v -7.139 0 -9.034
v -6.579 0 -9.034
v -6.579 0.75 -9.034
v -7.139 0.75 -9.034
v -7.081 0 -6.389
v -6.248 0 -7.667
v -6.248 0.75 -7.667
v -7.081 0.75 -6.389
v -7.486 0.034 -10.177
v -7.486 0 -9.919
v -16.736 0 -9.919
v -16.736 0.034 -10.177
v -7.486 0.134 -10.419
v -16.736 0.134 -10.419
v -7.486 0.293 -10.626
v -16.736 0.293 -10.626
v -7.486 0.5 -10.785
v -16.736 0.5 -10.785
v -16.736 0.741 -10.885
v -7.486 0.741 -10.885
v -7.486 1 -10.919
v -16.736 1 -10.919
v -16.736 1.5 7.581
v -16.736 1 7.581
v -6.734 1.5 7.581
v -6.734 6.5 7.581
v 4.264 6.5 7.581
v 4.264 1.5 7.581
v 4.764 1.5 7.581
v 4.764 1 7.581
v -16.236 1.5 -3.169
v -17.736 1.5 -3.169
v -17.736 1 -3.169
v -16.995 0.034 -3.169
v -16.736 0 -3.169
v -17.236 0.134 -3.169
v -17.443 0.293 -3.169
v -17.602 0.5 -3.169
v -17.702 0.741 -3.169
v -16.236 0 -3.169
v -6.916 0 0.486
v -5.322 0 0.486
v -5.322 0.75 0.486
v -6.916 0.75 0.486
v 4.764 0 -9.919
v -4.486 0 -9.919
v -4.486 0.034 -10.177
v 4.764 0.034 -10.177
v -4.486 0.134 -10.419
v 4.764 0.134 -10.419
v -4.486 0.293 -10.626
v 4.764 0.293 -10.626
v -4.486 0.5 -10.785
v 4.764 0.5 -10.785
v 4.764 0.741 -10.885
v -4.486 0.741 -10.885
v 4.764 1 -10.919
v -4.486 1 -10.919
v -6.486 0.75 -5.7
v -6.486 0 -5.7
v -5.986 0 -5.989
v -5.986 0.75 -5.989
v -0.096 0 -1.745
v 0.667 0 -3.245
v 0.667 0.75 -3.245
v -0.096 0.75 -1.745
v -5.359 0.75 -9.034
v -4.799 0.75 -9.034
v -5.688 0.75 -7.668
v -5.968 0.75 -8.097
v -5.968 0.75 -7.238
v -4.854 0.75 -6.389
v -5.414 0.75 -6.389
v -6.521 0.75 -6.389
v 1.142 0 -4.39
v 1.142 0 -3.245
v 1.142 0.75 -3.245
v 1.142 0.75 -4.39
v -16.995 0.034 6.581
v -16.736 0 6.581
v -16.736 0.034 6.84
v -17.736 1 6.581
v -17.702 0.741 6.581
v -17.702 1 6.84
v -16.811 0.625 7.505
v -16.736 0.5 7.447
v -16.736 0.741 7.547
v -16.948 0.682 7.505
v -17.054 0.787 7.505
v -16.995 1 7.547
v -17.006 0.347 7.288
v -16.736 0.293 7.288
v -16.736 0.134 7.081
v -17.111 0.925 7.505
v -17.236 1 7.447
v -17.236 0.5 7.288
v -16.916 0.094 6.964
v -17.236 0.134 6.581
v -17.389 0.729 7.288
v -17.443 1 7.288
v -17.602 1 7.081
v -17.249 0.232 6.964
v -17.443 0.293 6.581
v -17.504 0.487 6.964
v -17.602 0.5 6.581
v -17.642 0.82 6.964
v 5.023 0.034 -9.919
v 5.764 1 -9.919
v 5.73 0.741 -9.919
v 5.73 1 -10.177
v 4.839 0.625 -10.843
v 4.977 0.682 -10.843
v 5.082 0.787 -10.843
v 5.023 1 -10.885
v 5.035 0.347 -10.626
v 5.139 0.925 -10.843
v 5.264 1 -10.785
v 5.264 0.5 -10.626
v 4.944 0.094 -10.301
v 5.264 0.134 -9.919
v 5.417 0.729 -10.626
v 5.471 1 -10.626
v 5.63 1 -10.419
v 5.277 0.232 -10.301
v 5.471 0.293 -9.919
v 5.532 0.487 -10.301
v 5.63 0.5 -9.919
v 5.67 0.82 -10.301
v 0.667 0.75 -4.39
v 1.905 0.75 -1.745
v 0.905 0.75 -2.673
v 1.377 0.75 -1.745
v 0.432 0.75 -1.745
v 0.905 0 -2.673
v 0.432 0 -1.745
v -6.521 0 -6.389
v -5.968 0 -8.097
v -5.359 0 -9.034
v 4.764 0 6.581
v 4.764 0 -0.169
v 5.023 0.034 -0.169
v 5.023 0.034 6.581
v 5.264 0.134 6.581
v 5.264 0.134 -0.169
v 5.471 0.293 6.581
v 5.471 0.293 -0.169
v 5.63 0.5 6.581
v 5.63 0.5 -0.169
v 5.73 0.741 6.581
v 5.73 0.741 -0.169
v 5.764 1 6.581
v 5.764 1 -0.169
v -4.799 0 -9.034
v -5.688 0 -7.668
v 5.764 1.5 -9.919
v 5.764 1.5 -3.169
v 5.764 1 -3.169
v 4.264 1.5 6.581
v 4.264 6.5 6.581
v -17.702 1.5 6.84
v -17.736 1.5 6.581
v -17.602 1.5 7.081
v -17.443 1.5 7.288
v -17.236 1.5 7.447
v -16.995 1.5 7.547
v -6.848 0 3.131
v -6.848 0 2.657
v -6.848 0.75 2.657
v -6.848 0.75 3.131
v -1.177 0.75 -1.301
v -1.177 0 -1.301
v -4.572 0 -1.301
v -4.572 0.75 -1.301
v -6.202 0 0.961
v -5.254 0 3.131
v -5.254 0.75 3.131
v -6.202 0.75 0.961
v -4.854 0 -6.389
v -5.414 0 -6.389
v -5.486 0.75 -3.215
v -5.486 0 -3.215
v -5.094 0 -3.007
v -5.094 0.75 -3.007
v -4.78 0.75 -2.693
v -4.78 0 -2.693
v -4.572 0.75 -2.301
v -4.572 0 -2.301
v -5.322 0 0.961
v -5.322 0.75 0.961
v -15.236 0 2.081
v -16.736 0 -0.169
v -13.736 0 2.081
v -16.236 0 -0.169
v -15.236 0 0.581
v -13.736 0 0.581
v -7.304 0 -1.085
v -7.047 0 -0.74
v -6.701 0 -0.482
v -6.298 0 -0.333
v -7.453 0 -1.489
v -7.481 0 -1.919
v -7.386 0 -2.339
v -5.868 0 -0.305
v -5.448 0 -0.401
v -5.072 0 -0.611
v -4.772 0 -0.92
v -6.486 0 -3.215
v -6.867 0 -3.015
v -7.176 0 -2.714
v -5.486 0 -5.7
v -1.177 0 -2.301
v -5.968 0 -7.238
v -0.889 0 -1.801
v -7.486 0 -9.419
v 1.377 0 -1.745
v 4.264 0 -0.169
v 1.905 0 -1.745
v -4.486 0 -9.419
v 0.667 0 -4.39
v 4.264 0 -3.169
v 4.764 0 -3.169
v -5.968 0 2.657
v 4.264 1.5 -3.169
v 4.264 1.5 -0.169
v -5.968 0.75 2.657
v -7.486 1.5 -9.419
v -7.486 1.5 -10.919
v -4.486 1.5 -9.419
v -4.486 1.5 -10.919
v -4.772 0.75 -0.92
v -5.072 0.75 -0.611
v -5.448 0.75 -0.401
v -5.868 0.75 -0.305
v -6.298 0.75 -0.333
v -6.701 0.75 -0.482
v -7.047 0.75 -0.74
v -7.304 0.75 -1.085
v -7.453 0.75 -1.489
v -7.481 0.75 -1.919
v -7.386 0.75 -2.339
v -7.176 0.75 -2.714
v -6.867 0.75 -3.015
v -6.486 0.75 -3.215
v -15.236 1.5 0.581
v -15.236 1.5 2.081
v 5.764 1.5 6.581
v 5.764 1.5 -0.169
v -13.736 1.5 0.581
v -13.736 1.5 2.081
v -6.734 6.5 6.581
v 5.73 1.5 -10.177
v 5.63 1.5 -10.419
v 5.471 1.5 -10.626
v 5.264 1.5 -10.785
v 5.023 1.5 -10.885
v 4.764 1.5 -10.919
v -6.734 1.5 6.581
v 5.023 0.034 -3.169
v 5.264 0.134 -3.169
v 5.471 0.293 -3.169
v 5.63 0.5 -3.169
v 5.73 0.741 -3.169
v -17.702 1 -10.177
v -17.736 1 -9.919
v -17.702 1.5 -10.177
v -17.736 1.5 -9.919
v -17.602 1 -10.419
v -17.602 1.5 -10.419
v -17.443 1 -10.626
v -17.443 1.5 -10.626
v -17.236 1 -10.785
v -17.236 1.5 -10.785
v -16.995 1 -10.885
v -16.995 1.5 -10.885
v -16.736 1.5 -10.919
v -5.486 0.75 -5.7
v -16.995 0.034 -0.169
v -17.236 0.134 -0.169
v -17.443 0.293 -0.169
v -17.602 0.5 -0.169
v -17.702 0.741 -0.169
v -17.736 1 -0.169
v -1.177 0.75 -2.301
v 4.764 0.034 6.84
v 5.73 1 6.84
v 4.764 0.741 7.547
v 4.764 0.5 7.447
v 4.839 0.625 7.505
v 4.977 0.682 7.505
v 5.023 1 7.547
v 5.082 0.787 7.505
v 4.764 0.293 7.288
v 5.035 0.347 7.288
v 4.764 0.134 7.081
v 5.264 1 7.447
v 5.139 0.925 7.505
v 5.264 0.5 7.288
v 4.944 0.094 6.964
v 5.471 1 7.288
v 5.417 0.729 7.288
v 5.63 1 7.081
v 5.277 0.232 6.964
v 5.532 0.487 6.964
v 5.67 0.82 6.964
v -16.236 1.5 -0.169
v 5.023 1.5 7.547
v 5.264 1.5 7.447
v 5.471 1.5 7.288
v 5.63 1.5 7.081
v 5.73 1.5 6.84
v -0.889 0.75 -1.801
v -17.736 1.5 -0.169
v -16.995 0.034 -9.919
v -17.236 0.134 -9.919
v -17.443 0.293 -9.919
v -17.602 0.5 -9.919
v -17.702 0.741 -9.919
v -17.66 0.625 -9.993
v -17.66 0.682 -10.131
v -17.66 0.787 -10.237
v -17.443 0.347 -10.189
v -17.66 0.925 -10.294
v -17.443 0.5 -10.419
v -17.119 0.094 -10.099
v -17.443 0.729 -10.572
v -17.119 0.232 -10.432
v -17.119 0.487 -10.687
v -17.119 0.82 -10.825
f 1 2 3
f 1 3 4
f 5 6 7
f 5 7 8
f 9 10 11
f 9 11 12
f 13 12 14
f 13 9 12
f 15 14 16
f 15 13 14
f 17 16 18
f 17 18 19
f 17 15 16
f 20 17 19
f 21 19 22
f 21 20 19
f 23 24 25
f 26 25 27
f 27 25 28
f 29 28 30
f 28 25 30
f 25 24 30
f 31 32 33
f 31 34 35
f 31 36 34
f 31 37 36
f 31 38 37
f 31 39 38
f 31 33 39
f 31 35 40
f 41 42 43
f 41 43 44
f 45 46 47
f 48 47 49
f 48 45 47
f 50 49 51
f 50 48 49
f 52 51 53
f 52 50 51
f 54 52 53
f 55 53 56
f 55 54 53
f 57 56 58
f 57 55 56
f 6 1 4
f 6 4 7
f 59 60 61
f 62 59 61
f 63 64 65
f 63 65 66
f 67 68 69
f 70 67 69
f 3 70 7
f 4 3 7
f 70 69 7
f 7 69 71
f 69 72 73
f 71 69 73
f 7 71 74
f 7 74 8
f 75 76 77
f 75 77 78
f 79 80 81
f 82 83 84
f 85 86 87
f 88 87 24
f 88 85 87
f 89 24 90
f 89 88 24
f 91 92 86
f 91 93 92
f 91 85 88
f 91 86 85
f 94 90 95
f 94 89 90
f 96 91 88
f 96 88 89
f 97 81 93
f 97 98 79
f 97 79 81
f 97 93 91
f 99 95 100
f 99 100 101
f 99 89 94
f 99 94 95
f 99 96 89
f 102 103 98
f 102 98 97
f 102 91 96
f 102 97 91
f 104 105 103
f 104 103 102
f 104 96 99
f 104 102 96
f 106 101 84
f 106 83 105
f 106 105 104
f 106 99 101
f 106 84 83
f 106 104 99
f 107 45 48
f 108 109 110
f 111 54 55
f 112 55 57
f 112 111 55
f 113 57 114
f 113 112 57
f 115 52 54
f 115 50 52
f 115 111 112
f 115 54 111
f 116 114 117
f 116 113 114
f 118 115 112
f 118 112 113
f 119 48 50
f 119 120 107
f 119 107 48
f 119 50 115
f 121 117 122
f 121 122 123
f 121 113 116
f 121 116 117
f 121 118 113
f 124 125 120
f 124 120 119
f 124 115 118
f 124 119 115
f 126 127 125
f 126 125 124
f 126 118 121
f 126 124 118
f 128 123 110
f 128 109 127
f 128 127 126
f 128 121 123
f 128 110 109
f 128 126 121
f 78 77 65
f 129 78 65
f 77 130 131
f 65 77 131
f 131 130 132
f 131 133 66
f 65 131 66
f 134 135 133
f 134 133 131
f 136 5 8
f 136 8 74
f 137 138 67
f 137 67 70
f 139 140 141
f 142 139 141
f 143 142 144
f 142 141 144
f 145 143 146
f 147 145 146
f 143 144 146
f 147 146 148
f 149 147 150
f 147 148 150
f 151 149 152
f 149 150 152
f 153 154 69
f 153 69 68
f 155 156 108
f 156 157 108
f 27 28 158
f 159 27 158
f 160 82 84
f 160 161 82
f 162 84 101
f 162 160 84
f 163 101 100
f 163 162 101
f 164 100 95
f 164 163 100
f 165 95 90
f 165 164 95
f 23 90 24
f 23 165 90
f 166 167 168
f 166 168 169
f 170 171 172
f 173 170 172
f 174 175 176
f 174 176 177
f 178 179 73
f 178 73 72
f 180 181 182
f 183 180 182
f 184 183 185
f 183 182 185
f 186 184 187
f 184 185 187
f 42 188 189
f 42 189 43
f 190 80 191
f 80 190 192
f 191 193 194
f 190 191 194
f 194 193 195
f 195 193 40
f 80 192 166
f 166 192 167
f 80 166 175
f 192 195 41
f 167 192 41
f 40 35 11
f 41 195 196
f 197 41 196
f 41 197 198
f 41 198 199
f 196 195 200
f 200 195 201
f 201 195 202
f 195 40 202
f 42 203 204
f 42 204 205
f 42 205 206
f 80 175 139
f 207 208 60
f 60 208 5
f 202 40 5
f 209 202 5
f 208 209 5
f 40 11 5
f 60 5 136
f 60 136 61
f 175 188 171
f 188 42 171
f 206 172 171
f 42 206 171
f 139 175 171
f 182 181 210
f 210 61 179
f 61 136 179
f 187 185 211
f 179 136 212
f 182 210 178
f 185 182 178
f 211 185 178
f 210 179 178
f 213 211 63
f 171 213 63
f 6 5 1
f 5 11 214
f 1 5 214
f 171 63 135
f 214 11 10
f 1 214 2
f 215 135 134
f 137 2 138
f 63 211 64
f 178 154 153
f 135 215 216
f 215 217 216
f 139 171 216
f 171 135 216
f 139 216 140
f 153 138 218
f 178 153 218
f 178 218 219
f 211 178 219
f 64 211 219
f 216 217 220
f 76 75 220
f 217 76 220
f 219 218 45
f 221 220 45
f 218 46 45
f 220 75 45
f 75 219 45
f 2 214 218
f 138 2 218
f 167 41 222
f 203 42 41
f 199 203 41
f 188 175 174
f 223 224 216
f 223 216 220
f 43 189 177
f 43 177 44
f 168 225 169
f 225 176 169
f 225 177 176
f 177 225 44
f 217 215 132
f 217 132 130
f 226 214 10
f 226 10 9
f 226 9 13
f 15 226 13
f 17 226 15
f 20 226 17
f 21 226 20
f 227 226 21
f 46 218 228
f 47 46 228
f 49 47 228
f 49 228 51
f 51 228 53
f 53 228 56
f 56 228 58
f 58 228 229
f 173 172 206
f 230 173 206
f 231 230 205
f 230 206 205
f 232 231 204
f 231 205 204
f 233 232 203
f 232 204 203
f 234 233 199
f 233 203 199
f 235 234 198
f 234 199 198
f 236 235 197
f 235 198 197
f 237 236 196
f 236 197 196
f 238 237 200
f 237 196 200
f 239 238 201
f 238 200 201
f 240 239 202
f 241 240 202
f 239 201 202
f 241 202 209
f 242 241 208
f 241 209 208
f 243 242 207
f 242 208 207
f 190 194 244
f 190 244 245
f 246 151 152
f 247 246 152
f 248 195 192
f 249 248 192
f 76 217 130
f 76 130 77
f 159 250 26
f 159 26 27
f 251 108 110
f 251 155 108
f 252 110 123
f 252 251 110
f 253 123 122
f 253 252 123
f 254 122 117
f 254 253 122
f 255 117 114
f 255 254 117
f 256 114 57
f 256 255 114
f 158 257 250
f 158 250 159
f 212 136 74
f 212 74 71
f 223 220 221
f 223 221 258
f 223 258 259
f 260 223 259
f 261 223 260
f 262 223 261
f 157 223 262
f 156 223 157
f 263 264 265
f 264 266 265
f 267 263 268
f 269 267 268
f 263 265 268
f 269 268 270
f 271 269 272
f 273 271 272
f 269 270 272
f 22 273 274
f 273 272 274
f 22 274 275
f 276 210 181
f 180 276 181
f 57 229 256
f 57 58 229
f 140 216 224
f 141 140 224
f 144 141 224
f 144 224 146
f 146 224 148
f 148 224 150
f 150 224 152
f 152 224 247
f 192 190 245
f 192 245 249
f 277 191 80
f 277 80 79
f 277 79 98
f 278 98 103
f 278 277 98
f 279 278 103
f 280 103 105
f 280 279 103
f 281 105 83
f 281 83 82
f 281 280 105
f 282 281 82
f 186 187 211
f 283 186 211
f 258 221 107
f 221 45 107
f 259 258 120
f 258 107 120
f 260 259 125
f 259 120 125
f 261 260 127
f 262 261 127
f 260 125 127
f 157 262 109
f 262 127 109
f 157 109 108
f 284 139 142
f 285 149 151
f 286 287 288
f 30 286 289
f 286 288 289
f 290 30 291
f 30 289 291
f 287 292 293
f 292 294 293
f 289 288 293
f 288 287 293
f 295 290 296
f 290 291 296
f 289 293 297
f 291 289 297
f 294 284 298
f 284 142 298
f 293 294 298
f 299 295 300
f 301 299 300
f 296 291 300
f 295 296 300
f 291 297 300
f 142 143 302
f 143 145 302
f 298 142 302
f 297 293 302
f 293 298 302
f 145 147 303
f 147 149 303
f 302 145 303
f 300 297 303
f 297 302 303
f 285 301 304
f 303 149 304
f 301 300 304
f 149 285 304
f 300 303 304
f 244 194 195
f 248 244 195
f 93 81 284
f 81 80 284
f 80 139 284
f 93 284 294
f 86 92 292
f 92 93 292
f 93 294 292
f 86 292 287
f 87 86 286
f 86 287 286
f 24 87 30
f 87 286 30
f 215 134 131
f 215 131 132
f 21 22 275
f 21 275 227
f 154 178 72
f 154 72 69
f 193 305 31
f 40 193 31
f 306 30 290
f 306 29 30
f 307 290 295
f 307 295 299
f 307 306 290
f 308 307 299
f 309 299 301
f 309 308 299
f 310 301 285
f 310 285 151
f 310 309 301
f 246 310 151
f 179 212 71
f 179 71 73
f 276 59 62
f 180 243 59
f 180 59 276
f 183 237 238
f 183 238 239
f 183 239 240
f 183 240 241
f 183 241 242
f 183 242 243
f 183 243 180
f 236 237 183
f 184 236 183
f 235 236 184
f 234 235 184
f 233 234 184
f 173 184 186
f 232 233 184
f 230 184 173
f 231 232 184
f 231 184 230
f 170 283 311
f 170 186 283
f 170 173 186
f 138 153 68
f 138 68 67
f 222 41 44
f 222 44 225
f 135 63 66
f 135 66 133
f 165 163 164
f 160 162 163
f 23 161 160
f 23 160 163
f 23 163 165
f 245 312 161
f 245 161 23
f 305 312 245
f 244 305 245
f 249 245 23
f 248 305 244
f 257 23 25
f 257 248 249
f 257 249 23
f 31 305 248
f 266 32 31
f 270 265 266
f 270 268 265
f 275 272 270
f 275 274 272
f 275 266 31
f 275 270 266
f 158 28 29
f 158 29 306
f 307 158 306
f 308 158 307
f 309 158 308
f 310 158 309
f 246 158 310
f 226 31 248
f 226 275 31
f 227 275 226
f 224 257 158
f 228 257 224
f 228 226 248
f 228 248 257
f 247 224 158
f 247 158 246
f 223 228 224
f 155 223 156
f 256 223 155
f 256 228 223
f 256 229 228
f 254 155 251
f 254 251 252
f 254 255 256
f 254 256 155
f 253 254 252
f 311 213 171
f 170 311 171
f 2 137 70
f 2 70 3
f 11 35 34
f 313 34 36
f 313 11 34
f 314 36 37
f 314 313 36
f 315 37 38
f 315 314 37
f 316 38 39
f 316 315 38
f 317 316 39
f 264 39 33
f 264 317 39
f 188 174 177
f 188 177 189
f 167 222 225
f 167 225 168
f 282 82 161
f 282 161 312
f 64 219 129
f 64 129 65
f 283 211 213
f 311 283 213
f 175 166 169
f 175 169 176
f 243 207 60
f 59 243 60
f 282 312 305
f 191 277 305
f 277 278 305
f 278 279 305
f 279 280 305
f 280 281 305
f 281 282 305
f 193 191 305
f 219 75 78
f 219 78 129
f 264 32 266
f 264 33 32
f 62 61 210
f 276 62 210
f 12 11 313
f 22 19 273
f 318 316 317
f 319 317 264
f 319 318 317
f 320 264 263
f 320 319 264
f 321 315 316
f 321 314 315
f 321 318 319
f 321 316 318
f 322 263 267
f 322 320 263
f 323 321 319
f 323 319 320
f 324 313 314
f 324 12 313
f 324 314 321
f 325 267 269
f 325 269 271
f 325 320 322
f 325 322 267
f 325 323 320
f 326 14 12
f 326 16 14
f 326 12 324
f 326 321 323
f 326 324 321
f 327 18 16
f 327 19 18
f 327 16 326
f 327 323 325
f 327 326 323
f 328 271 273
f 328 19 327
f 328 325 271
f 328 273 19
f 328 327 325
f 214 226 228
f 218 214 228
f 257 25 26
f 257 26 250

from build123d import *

# Parameters (mm, degrees)
SKETCH1_W           = 23.5
SKETCH1_H           = 18.5
BOSS_EXTRUDE1_DEPTH = 1.5
SKETCH2_W           = 3
SKETCH2_H           = 1.5
SKETCH2_W_2         = 1.5
SKETCH2_H_2         = 3
CUT_EXTRUDE1_DEPTH  = 1.5
SKETCH3_W           = 10
SKETCH3_H           = 1
BOSS_EXTRUDE2_DEPTH = 5
CUT_EXTRUDE3_DEPTH  = 0.75
SKETCH5_W           = 1.5
SKETCH5_H           = 1.5
CUT_EXTRUDE4_DEPTH  = 1.5
FILLET1_R           = 1
FILLET4_R           = 1
SKETCH7_W           = 0.998185699
SKETCH7_H           = 1
BOSS_EXTRUDE3_DEPTH = 5


with BuildPart() as part:
    # Sketch1 → Boss-Extrude1 (new body)
    with BuildSketch(Plane(origin=(0, 0, 0), x_dir=(1, 0, 0), z_dir=(0, 1, 0))):
        with Locations((-5.985849057, 1.668632075)):
            Rectangle(SKETCH1_W, SKETCH1_H)
    extrude(amount=BOSS_EXTRUDE1_DEPTH)

    # Sketch2 → Cut-Extrude1 (cut)
    with BuildSketch(Plane(origin=(0, 1.5, 0), x_dir=(1, 0, 0), z_dir=(0, 1, 0))):
        with Locations((-5.985849057, 10.168632075)):
            Rectangle(SKETCH2_W, SKETCH2_H)
        with Locations((-16.985849057, 1.668632075)):
            Rectangle(SKETCH2_W_2, SKETCH2_H_2)
        with Locations((5.014150943, 1.668632075)):
            Rectangle(SKETCH2_W_2, SKETCH2_H_2)
    extrude(amount=-CUT_EXTRUDE1_DEPTH, mode=Mode.SUBTRACT)

    # Sketch3 → Boss-Extrude2 (add)
    with BuildSketch(Plane(origin=(0, 1.5, 0), x_dir=(1, 0, 0), z_dir=(0, 1, 0))):
        with Locations((-0.735849057, -7.081367925)):
            Rectangle(SKETCH3_W, SKETCH3_H)
    extrude(amount=BOSS_EXTRUDE2_DEPTH)

    # Sketch4 → Cut-Extrude3 (cut)
    with BuildSketch(Plane.XZ):
        with BuildLine():
            Line((-1.177314548, -2.300719994), (-0.888639414, -1.800719994))
            Line((-0.888639414, -1.800719994), (-1.177314548, -1.300719994))
            Line((-1.177314548, -1.300719994), (-4.571635494, -1.300719994))
            ThreePointArc((-4.571635494, -1.300719994), (-7.046509228, -0.740059822), (-6.485849057, -3.214933557))
            Line((-6.485849057, -3.214933557), (-6.485849057, -5.700361827))
            Line((-6.485849057, -5.700361827), (-5.985849057, -5.989036962))
            Line((-5.985849057, -5.989036962), (-5.485849057, -5.700361827))
            Line((-5.485849057, -5.700361827), (-5.485849057, -3.214933557))
            ThreePointArc((-5.485849057, -3.214933557), (-4.925188885, -2.861380166), (-4.571635494, -2.300719994))
            Line((-4.571635494, -2.300719994), (-1.177314548, -2.300719994))
        make_face()
        Polygon((-7.080591406, -6.388557959), (-6.520895893, -6.388557959), (-5.968090572, -7.238171507), (-5.41422522, -6.388557959), (-4.853999693, -6.388557959), (-5.688242815, -7.668013421), (-4.798878165, -9.034391292), (-5.358573678, -9.034391292), (-5.968090572, -8.09732532), (-6.579197509, -9.034391292), (-7.139423037, -9.034391292), (-6.247938328, -7.667483406), align=None)
        Polygon((-6.848224631, 3.131460083), (-5.253940443, 3.131460083), (-6.201606709, 0.960519912), (-5.321782324, 0.960519912), (-5.321782324, 0.48562675), (-6.916066512, 0.48562675), (-5.967870231, 2.656566921), (-6.848224631, 2.656566921), align=None)
        Polygon((-0.096157656, -1.744646719), (0.43226699, -1.744646719), (0.904510079, -2.672702441), (1.376753168, -1.744646719), (1.905177814, -1.744646719), (1.14195666, -3.244588292), (1.14195666, -4.390480052), (0.667063498, -4.390480052), (0.667063498, -3.244588292), align=None)
    extrude(amount=-CUT_EXTRUDE3_DEPTH, mode=Mode.SUBTRACT)

    # Sketch5 → Cut-Extrude4 (cut)
    with BuildSketch(Plane.XZ):
        with Locations((-14.485849057, 1.331367925)):
            Rectangle(SKETCH5_W, SKETCH5_H)
    extrude(amount=-CUT_EXTRUDE4_DEPTH, mode=Mode.SUBTRACT)

    # Fillet1
    fillet1_edges = [part.edges().sort_by_distance(p)[0] for p in [
        (-12.610849057, 0, -10.918632075),
        (5.764150943, 0, -7.043632075),
        (0.639150943, 0, -10.918632075),
        (-17.735849057, 0, -7.043632075),
        (-17.735849057, 0.75, -10.918632075),
        (5.764150943, 0.75, -10.918632075),
    ]]
    fillet(fillet1_edges, radius=FILLET1_R)

    # Fillet4
    fillet4_edges = [part.edges().sort_by_distance(p)[0] for p in [
        (-17.735849057, 0, 3.706367925),
        (5.764150943, 0, 3.706367925),
        (-5.985849057, 0, 7.581367925),
        (5.764150943, 0.75, 7.581367925),
        (-17.735849057, 0.75, 7.581367925),
    ]]
    fillet(fillet4_edges, radius=FILLET4_R)

    # Sketch7 → Boss-Extrude3 (add)
    with BuildSketch(Plane(origin=(0, 1.5, 0), x_dir=(1, 0, 0), z_dir=(0, 1, 0))):
        with Locations((-6.234941907, -7.081367925)):
            Rectangle(SKETCH7_W, SKETCH7_H)
    extrude(amount=BOSS_EXTRUDE3_DEPTH)


solid = part.part
